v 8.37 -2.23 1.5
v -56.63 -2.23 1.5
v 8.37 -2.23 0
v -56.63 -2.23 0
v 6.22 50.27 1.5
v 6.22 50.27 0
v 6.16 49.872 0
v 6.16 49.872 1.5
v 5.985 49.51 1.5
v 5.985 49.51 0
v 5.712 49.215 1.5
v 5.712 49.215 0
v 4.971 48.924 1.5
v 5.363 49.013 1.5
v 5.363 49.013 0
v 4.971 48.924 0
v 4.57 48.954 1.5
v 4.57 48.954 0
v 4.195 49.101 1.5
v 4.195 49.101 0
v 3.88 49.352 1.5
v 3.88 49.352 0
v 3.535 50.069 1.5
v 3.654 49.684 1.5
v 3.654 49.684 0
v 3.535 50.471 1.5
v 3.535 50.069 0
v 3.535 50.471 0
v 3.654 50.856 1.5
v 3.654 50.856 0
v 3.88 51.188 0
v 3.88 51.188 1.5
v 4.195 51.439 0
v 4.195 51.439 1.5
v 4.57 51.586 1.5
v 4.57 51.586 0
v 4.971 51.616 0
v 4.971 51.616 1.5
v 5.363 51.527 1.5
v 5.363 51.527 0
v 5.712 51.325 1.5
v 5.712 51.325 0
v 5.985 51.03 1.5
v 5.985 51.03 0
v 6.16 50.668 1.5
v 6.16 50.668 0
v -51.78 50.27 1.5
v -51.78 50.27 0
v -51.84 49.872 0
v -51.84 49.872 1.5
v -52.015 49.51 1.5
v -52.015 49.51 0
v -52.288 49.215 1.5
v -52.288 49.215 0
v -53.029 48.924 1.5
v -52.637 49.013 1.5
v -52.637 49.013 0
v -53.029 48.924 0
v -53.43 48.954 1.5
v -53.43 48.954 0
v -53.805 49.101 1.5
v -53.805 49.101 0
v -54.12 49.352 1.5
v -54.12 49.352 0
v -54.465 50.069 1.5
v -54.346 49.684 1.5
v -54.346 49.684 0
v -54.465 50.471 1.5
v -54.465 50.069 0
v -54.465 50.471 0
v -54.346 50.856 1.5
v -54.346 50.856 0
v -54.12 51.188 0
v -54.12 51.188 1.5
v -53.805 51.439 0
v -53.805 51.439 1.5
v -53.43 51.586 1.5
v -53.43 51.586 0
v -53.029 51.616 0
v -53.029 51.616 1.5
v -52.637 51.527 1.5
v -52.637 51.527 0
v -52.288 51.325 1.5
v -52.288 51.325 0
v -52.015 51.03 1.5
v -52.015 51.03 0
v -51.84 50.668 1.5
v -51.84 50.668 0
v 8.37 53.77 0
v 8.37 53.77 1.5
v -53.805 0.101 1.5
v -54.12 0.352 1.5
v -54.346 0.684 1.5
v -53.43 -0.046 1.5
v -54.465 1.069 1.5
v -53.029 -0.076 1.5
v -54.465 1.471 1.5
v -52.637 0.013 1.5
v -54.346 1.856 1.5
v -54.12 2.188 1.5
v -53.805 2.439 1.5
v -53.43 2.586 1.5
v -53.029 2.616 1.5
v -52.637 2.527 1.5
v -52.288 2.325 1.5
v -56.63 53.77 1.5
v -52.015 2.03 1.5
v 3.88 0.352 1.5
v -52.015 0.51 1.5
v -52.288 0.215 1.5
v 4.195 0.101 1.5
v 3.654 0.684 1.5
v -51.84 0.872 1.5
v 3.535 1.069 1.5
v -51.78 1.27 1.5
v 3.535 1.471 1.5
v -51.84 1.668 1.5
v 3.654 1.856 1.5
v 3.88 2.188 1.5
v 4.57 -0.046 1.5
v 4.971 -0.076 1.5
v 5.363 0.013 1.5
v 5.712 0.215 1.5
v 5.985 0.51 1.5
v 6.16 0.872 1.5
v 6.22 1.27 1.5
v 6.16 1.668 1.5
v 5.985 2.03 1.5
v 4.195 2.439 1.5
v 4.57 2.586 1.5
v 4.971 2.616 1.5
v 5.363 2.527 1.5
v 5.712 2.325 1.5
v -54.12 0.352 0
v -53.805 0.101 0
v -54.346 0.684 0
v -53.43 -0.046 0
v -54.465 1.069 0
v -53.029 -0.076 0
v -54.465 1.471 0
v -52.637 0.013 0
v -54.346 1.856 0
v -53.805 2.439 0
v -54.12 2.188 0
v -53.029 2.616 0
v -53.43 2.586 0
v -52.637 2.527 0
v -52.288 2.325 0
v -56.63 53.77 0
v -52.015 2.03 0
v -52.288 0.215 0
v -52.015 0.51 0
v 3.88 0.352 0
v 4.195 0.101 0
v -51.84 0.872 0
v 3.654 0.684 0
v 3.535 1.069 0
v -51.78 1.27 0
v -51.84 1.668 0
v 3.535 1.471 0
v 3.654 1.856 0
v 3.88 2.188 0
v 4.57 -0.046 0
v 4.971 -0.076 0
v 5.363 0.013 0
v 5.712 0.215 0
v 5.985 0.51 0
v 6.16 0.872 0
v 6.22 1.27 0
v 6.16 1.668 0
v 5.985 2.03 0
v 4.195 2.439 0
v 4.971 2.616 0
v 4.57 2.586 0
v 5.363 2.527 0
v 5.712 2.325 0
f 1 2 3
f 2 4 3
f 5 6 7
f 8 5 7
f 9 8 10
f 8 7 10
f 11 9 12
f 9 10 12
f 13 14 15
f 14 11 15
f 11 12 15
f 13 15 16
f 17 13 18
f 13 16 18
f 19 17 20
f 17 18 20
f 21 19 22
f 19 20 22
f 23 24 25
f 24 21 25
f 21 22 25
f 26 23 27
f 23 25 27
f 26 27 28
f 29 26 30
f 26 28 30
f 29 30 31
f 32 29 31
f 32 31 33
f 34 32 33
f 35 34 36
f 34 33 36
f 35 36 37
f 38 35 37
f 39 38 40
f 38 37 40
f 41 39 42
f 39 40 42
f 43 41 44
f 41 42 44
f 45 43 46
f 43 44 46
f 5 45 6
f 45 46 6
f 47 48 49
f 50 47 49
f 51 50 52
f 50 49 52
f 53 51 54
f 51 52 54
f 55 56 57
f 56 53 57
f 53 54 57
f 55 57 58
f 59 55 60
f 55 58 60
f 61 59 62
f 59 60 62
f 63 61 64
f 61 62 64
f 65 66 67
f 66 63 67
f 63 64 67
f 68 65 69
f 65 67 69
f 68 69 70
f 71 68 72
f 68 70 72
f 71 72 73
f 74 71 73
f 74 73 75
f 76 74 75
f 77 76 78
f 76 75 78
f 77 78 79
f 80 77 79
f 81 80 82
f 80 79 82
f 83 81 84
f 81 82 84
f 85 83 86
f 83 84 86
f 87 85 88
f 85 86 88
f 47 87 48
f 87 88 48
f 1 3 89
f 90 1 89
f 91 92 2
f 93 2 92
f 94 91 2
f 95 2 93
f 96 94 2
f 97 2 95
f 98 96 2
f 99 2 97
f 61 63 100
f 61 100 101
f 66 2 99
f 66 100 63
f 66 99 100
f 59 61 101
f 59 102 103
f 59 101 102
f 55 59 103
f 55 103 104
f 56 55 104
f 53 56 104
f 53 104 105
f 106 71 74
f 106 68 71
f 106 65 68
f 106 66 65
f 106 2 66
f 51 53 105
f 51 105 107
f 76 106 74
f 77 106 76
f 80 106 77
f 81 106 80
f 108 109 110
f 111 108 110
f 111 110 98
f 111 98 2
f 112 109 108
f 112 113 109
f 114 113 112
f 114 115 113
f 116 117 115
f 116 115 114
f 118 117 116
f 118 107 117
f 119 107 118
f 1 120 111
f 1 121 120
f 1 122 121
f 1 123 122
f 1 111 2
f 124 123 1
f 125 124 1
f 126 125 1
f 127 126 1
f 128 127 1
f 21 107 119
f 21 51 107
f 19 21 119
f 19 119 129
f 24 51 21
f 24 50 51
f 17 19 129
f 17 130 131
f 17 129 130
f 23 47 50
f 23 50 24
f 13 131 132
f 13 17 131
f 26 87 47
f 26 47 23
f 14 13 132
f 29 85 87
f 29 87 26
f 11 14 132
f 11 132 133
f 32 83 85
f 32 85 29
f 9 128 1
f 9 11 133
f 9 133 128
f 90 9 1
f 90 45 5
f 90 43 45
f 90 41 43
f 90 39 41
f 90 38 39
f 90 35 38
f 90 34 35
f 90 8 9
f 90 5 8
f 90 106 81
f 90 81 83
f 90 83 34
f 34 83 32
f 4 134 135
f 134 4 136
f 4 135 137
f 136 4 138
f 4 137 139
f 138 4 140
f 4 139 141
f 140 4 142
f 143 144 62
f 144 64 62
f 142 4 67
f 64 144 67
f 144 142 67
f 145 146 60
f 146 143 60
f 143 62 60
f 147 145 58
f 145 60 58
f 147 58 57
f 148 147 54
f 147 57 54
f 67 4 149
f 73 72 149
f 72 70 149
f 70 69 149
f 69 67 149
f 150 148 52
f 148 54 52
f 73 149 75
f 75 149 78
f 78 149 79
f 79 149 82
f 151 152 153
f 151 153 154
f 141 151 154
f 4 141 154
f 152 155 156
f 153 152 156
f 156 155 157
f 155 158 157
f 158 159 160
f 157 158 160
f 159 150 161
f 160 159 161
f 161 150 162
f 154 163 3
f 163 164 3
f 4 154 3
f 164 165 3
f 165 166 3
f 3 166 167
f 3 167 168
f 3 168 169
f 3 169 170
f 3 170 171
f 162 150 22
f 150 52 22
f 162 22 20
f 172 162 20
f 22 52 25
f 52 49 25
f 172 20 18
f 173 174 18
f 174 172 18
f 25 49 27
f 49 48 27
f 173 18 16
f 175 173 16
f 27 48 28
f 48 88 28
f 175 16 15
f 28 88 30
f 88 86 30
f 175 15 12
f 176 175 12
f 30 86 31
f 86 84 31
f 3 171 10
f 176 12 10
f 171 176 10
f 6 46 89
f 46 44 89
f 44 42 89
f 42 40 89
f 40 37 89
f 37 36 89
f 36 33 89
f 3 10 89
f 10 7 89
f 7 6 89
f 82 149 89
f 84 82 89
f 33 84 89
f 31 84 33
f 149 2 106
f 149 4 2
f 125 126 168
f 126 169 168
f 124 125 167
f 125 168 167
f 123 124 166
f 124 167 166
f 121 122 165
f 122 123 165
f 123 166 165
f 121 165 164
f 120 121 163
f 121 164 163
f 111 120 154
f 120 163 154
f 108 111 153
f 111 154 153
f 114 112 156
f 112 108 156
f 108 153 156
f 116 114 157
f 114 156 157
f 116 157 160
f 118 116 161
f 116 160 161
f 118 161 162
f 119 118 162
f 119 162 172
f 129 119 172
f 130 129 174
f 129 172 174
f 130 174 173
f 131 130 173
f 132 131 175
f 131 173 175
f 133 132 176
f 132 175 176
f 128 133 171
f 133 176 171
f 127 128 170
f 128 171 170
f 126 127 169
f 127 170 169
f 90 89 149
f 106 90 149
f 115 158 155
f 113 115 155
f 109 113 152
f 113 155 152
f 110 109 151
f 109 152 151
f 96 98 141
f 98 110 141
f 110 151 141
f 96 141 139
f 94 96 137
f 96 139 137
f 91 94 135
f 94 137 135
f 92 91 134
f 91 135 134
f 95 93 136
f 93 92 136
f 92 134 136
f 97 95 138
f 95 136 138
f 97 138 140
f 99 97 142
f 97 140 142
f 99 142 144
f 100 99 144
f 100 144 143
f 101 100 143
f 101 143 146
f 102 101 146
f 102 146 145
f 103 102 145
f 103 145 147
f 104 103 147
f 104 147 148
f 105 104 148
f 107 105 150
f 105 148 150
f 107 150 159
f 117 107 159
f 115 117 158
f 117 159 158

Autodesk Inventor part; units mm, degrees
ref_plane "YZ Plane" through (0, 0, 0) normal (1, 0, 0) x (0, 1, 0)
ref_plane "XZ Plane" through (0, 0, 0) normal (0, 1, 0) x (-1, 0, 0)
ref_plane "XY Plane" through (0, 0, 0) normal (0, 0, 1) x (1, 0, 0)
sketch "Эскиз1" plane through (0, 0, 0) normal (0, 0, 1) x (1, 0, 0)
  line L0 (-73.63, -2.23) -> (5.37, -2.23) projected
  arc A0 (5.37, -2.23) -> (8.37, 0.77) centre (5.37, 0.77) ccw projected
  line L1 (8.37, 0.77) -> (8.37, 50.77) projected
  arc A1 (8.37, 50.77) -> (5.37, 53.77) centre (5.37, 50.77) ccw projected
  line L2 (5.37, 53.77) -> (-73.63, 53.77) projected
  arc A2 (-73.63, 53.77) -> (-76.63, 50.77) centre (-73.63, 50.77) ccw projected
  line L3 (-76.63, 50.77) -> (-76.63, 0.77) projected
  arc A3 (-76.63, 0.77) -> (-73.63, -2.23) centre (-73.63, 0.77) ccw projected
  circle A4 centre (4.87, 50.27) radius 1.35 projected
  circle A5 centre (-53.13, 50.27) radius 1.35 projected
  circle A6 centre (0.07, 48.67) radius 0.325 projected
  circle A7 centre (-5.73, 48.67) radius 0.325 projected
  circle A8 centre (-68.88, 49.235) radius 1.65 projected
  circle A9 centre (4.87, 44.27) radius 1.55 projected
  circle A10 centre (-68.88, 37.805) radius 1.65 projected
  circle A11 centre (-53.13, 7.27) radius 1.55 projected
  circle A12 centre (4.87, 1.27) radius 1.35 projected
  circle A13 centre (-53.13, 1.27) radius 1.35 projected
  line L4 (5.37, -2.23) -> (8.37, -2.23) construction
  line L5 (8.37, -2.23) -> (8.37, 0.77) construction
  line L6 (8.37, 0.77) -> (5.37, 0.77) construction
  line L7 (5.37, 0.77) -> (5.37, -2.23) construction
  line L8 (8.37, -2.23) -> (-56.63, -2.23)
  line L9 (-56.63, -2.23) -> (-56.63, 53.77)
  line L10 (-56.63, 53.77) -> (8.37, 53.77)
  line L11 (8.37, 53.77) -> (8.37, -2.23)
  line L12 (8.37, -2.23) -> (-56.63, -2.23)
  line L13 (-56.63, -2.23) -> (-56.63, -13.23)
  line L14 (-56.63, -13.23) -> (8.37, -13.23)
  line L15 (8.37, -13.23) -> (8.37, -2.23)
  line L16 (-56.63, 53.77) -> (8.37, 53.77)
  line L17 (8.37, 53.77) -> (8.37, 61.77)
  line L18 (8.37, 61.77) -> (-56.63, 61.77)
  line L19 (-56.63, 61.77) -> (-56.63, 53.77)
  point P0 (0, 0)
  point P1 (8.37, 0.77)
  point P2 (8.37, 53.77)
  dimension "d0" = 65
  dimension "d1" = 56
  dimension "d8" = 65
  dimension "d9" = 11
  dimension "d10" = 8
extrude "Выдавливание1" add sketch "Эскиз1" along normal blind 1.5 contours L9 L2 A1 L1 A0 L0 | A0 L11 L8 | L10 L11 A1 | A6 | A7 | A9 | A11
properties part number "board_rpi"
